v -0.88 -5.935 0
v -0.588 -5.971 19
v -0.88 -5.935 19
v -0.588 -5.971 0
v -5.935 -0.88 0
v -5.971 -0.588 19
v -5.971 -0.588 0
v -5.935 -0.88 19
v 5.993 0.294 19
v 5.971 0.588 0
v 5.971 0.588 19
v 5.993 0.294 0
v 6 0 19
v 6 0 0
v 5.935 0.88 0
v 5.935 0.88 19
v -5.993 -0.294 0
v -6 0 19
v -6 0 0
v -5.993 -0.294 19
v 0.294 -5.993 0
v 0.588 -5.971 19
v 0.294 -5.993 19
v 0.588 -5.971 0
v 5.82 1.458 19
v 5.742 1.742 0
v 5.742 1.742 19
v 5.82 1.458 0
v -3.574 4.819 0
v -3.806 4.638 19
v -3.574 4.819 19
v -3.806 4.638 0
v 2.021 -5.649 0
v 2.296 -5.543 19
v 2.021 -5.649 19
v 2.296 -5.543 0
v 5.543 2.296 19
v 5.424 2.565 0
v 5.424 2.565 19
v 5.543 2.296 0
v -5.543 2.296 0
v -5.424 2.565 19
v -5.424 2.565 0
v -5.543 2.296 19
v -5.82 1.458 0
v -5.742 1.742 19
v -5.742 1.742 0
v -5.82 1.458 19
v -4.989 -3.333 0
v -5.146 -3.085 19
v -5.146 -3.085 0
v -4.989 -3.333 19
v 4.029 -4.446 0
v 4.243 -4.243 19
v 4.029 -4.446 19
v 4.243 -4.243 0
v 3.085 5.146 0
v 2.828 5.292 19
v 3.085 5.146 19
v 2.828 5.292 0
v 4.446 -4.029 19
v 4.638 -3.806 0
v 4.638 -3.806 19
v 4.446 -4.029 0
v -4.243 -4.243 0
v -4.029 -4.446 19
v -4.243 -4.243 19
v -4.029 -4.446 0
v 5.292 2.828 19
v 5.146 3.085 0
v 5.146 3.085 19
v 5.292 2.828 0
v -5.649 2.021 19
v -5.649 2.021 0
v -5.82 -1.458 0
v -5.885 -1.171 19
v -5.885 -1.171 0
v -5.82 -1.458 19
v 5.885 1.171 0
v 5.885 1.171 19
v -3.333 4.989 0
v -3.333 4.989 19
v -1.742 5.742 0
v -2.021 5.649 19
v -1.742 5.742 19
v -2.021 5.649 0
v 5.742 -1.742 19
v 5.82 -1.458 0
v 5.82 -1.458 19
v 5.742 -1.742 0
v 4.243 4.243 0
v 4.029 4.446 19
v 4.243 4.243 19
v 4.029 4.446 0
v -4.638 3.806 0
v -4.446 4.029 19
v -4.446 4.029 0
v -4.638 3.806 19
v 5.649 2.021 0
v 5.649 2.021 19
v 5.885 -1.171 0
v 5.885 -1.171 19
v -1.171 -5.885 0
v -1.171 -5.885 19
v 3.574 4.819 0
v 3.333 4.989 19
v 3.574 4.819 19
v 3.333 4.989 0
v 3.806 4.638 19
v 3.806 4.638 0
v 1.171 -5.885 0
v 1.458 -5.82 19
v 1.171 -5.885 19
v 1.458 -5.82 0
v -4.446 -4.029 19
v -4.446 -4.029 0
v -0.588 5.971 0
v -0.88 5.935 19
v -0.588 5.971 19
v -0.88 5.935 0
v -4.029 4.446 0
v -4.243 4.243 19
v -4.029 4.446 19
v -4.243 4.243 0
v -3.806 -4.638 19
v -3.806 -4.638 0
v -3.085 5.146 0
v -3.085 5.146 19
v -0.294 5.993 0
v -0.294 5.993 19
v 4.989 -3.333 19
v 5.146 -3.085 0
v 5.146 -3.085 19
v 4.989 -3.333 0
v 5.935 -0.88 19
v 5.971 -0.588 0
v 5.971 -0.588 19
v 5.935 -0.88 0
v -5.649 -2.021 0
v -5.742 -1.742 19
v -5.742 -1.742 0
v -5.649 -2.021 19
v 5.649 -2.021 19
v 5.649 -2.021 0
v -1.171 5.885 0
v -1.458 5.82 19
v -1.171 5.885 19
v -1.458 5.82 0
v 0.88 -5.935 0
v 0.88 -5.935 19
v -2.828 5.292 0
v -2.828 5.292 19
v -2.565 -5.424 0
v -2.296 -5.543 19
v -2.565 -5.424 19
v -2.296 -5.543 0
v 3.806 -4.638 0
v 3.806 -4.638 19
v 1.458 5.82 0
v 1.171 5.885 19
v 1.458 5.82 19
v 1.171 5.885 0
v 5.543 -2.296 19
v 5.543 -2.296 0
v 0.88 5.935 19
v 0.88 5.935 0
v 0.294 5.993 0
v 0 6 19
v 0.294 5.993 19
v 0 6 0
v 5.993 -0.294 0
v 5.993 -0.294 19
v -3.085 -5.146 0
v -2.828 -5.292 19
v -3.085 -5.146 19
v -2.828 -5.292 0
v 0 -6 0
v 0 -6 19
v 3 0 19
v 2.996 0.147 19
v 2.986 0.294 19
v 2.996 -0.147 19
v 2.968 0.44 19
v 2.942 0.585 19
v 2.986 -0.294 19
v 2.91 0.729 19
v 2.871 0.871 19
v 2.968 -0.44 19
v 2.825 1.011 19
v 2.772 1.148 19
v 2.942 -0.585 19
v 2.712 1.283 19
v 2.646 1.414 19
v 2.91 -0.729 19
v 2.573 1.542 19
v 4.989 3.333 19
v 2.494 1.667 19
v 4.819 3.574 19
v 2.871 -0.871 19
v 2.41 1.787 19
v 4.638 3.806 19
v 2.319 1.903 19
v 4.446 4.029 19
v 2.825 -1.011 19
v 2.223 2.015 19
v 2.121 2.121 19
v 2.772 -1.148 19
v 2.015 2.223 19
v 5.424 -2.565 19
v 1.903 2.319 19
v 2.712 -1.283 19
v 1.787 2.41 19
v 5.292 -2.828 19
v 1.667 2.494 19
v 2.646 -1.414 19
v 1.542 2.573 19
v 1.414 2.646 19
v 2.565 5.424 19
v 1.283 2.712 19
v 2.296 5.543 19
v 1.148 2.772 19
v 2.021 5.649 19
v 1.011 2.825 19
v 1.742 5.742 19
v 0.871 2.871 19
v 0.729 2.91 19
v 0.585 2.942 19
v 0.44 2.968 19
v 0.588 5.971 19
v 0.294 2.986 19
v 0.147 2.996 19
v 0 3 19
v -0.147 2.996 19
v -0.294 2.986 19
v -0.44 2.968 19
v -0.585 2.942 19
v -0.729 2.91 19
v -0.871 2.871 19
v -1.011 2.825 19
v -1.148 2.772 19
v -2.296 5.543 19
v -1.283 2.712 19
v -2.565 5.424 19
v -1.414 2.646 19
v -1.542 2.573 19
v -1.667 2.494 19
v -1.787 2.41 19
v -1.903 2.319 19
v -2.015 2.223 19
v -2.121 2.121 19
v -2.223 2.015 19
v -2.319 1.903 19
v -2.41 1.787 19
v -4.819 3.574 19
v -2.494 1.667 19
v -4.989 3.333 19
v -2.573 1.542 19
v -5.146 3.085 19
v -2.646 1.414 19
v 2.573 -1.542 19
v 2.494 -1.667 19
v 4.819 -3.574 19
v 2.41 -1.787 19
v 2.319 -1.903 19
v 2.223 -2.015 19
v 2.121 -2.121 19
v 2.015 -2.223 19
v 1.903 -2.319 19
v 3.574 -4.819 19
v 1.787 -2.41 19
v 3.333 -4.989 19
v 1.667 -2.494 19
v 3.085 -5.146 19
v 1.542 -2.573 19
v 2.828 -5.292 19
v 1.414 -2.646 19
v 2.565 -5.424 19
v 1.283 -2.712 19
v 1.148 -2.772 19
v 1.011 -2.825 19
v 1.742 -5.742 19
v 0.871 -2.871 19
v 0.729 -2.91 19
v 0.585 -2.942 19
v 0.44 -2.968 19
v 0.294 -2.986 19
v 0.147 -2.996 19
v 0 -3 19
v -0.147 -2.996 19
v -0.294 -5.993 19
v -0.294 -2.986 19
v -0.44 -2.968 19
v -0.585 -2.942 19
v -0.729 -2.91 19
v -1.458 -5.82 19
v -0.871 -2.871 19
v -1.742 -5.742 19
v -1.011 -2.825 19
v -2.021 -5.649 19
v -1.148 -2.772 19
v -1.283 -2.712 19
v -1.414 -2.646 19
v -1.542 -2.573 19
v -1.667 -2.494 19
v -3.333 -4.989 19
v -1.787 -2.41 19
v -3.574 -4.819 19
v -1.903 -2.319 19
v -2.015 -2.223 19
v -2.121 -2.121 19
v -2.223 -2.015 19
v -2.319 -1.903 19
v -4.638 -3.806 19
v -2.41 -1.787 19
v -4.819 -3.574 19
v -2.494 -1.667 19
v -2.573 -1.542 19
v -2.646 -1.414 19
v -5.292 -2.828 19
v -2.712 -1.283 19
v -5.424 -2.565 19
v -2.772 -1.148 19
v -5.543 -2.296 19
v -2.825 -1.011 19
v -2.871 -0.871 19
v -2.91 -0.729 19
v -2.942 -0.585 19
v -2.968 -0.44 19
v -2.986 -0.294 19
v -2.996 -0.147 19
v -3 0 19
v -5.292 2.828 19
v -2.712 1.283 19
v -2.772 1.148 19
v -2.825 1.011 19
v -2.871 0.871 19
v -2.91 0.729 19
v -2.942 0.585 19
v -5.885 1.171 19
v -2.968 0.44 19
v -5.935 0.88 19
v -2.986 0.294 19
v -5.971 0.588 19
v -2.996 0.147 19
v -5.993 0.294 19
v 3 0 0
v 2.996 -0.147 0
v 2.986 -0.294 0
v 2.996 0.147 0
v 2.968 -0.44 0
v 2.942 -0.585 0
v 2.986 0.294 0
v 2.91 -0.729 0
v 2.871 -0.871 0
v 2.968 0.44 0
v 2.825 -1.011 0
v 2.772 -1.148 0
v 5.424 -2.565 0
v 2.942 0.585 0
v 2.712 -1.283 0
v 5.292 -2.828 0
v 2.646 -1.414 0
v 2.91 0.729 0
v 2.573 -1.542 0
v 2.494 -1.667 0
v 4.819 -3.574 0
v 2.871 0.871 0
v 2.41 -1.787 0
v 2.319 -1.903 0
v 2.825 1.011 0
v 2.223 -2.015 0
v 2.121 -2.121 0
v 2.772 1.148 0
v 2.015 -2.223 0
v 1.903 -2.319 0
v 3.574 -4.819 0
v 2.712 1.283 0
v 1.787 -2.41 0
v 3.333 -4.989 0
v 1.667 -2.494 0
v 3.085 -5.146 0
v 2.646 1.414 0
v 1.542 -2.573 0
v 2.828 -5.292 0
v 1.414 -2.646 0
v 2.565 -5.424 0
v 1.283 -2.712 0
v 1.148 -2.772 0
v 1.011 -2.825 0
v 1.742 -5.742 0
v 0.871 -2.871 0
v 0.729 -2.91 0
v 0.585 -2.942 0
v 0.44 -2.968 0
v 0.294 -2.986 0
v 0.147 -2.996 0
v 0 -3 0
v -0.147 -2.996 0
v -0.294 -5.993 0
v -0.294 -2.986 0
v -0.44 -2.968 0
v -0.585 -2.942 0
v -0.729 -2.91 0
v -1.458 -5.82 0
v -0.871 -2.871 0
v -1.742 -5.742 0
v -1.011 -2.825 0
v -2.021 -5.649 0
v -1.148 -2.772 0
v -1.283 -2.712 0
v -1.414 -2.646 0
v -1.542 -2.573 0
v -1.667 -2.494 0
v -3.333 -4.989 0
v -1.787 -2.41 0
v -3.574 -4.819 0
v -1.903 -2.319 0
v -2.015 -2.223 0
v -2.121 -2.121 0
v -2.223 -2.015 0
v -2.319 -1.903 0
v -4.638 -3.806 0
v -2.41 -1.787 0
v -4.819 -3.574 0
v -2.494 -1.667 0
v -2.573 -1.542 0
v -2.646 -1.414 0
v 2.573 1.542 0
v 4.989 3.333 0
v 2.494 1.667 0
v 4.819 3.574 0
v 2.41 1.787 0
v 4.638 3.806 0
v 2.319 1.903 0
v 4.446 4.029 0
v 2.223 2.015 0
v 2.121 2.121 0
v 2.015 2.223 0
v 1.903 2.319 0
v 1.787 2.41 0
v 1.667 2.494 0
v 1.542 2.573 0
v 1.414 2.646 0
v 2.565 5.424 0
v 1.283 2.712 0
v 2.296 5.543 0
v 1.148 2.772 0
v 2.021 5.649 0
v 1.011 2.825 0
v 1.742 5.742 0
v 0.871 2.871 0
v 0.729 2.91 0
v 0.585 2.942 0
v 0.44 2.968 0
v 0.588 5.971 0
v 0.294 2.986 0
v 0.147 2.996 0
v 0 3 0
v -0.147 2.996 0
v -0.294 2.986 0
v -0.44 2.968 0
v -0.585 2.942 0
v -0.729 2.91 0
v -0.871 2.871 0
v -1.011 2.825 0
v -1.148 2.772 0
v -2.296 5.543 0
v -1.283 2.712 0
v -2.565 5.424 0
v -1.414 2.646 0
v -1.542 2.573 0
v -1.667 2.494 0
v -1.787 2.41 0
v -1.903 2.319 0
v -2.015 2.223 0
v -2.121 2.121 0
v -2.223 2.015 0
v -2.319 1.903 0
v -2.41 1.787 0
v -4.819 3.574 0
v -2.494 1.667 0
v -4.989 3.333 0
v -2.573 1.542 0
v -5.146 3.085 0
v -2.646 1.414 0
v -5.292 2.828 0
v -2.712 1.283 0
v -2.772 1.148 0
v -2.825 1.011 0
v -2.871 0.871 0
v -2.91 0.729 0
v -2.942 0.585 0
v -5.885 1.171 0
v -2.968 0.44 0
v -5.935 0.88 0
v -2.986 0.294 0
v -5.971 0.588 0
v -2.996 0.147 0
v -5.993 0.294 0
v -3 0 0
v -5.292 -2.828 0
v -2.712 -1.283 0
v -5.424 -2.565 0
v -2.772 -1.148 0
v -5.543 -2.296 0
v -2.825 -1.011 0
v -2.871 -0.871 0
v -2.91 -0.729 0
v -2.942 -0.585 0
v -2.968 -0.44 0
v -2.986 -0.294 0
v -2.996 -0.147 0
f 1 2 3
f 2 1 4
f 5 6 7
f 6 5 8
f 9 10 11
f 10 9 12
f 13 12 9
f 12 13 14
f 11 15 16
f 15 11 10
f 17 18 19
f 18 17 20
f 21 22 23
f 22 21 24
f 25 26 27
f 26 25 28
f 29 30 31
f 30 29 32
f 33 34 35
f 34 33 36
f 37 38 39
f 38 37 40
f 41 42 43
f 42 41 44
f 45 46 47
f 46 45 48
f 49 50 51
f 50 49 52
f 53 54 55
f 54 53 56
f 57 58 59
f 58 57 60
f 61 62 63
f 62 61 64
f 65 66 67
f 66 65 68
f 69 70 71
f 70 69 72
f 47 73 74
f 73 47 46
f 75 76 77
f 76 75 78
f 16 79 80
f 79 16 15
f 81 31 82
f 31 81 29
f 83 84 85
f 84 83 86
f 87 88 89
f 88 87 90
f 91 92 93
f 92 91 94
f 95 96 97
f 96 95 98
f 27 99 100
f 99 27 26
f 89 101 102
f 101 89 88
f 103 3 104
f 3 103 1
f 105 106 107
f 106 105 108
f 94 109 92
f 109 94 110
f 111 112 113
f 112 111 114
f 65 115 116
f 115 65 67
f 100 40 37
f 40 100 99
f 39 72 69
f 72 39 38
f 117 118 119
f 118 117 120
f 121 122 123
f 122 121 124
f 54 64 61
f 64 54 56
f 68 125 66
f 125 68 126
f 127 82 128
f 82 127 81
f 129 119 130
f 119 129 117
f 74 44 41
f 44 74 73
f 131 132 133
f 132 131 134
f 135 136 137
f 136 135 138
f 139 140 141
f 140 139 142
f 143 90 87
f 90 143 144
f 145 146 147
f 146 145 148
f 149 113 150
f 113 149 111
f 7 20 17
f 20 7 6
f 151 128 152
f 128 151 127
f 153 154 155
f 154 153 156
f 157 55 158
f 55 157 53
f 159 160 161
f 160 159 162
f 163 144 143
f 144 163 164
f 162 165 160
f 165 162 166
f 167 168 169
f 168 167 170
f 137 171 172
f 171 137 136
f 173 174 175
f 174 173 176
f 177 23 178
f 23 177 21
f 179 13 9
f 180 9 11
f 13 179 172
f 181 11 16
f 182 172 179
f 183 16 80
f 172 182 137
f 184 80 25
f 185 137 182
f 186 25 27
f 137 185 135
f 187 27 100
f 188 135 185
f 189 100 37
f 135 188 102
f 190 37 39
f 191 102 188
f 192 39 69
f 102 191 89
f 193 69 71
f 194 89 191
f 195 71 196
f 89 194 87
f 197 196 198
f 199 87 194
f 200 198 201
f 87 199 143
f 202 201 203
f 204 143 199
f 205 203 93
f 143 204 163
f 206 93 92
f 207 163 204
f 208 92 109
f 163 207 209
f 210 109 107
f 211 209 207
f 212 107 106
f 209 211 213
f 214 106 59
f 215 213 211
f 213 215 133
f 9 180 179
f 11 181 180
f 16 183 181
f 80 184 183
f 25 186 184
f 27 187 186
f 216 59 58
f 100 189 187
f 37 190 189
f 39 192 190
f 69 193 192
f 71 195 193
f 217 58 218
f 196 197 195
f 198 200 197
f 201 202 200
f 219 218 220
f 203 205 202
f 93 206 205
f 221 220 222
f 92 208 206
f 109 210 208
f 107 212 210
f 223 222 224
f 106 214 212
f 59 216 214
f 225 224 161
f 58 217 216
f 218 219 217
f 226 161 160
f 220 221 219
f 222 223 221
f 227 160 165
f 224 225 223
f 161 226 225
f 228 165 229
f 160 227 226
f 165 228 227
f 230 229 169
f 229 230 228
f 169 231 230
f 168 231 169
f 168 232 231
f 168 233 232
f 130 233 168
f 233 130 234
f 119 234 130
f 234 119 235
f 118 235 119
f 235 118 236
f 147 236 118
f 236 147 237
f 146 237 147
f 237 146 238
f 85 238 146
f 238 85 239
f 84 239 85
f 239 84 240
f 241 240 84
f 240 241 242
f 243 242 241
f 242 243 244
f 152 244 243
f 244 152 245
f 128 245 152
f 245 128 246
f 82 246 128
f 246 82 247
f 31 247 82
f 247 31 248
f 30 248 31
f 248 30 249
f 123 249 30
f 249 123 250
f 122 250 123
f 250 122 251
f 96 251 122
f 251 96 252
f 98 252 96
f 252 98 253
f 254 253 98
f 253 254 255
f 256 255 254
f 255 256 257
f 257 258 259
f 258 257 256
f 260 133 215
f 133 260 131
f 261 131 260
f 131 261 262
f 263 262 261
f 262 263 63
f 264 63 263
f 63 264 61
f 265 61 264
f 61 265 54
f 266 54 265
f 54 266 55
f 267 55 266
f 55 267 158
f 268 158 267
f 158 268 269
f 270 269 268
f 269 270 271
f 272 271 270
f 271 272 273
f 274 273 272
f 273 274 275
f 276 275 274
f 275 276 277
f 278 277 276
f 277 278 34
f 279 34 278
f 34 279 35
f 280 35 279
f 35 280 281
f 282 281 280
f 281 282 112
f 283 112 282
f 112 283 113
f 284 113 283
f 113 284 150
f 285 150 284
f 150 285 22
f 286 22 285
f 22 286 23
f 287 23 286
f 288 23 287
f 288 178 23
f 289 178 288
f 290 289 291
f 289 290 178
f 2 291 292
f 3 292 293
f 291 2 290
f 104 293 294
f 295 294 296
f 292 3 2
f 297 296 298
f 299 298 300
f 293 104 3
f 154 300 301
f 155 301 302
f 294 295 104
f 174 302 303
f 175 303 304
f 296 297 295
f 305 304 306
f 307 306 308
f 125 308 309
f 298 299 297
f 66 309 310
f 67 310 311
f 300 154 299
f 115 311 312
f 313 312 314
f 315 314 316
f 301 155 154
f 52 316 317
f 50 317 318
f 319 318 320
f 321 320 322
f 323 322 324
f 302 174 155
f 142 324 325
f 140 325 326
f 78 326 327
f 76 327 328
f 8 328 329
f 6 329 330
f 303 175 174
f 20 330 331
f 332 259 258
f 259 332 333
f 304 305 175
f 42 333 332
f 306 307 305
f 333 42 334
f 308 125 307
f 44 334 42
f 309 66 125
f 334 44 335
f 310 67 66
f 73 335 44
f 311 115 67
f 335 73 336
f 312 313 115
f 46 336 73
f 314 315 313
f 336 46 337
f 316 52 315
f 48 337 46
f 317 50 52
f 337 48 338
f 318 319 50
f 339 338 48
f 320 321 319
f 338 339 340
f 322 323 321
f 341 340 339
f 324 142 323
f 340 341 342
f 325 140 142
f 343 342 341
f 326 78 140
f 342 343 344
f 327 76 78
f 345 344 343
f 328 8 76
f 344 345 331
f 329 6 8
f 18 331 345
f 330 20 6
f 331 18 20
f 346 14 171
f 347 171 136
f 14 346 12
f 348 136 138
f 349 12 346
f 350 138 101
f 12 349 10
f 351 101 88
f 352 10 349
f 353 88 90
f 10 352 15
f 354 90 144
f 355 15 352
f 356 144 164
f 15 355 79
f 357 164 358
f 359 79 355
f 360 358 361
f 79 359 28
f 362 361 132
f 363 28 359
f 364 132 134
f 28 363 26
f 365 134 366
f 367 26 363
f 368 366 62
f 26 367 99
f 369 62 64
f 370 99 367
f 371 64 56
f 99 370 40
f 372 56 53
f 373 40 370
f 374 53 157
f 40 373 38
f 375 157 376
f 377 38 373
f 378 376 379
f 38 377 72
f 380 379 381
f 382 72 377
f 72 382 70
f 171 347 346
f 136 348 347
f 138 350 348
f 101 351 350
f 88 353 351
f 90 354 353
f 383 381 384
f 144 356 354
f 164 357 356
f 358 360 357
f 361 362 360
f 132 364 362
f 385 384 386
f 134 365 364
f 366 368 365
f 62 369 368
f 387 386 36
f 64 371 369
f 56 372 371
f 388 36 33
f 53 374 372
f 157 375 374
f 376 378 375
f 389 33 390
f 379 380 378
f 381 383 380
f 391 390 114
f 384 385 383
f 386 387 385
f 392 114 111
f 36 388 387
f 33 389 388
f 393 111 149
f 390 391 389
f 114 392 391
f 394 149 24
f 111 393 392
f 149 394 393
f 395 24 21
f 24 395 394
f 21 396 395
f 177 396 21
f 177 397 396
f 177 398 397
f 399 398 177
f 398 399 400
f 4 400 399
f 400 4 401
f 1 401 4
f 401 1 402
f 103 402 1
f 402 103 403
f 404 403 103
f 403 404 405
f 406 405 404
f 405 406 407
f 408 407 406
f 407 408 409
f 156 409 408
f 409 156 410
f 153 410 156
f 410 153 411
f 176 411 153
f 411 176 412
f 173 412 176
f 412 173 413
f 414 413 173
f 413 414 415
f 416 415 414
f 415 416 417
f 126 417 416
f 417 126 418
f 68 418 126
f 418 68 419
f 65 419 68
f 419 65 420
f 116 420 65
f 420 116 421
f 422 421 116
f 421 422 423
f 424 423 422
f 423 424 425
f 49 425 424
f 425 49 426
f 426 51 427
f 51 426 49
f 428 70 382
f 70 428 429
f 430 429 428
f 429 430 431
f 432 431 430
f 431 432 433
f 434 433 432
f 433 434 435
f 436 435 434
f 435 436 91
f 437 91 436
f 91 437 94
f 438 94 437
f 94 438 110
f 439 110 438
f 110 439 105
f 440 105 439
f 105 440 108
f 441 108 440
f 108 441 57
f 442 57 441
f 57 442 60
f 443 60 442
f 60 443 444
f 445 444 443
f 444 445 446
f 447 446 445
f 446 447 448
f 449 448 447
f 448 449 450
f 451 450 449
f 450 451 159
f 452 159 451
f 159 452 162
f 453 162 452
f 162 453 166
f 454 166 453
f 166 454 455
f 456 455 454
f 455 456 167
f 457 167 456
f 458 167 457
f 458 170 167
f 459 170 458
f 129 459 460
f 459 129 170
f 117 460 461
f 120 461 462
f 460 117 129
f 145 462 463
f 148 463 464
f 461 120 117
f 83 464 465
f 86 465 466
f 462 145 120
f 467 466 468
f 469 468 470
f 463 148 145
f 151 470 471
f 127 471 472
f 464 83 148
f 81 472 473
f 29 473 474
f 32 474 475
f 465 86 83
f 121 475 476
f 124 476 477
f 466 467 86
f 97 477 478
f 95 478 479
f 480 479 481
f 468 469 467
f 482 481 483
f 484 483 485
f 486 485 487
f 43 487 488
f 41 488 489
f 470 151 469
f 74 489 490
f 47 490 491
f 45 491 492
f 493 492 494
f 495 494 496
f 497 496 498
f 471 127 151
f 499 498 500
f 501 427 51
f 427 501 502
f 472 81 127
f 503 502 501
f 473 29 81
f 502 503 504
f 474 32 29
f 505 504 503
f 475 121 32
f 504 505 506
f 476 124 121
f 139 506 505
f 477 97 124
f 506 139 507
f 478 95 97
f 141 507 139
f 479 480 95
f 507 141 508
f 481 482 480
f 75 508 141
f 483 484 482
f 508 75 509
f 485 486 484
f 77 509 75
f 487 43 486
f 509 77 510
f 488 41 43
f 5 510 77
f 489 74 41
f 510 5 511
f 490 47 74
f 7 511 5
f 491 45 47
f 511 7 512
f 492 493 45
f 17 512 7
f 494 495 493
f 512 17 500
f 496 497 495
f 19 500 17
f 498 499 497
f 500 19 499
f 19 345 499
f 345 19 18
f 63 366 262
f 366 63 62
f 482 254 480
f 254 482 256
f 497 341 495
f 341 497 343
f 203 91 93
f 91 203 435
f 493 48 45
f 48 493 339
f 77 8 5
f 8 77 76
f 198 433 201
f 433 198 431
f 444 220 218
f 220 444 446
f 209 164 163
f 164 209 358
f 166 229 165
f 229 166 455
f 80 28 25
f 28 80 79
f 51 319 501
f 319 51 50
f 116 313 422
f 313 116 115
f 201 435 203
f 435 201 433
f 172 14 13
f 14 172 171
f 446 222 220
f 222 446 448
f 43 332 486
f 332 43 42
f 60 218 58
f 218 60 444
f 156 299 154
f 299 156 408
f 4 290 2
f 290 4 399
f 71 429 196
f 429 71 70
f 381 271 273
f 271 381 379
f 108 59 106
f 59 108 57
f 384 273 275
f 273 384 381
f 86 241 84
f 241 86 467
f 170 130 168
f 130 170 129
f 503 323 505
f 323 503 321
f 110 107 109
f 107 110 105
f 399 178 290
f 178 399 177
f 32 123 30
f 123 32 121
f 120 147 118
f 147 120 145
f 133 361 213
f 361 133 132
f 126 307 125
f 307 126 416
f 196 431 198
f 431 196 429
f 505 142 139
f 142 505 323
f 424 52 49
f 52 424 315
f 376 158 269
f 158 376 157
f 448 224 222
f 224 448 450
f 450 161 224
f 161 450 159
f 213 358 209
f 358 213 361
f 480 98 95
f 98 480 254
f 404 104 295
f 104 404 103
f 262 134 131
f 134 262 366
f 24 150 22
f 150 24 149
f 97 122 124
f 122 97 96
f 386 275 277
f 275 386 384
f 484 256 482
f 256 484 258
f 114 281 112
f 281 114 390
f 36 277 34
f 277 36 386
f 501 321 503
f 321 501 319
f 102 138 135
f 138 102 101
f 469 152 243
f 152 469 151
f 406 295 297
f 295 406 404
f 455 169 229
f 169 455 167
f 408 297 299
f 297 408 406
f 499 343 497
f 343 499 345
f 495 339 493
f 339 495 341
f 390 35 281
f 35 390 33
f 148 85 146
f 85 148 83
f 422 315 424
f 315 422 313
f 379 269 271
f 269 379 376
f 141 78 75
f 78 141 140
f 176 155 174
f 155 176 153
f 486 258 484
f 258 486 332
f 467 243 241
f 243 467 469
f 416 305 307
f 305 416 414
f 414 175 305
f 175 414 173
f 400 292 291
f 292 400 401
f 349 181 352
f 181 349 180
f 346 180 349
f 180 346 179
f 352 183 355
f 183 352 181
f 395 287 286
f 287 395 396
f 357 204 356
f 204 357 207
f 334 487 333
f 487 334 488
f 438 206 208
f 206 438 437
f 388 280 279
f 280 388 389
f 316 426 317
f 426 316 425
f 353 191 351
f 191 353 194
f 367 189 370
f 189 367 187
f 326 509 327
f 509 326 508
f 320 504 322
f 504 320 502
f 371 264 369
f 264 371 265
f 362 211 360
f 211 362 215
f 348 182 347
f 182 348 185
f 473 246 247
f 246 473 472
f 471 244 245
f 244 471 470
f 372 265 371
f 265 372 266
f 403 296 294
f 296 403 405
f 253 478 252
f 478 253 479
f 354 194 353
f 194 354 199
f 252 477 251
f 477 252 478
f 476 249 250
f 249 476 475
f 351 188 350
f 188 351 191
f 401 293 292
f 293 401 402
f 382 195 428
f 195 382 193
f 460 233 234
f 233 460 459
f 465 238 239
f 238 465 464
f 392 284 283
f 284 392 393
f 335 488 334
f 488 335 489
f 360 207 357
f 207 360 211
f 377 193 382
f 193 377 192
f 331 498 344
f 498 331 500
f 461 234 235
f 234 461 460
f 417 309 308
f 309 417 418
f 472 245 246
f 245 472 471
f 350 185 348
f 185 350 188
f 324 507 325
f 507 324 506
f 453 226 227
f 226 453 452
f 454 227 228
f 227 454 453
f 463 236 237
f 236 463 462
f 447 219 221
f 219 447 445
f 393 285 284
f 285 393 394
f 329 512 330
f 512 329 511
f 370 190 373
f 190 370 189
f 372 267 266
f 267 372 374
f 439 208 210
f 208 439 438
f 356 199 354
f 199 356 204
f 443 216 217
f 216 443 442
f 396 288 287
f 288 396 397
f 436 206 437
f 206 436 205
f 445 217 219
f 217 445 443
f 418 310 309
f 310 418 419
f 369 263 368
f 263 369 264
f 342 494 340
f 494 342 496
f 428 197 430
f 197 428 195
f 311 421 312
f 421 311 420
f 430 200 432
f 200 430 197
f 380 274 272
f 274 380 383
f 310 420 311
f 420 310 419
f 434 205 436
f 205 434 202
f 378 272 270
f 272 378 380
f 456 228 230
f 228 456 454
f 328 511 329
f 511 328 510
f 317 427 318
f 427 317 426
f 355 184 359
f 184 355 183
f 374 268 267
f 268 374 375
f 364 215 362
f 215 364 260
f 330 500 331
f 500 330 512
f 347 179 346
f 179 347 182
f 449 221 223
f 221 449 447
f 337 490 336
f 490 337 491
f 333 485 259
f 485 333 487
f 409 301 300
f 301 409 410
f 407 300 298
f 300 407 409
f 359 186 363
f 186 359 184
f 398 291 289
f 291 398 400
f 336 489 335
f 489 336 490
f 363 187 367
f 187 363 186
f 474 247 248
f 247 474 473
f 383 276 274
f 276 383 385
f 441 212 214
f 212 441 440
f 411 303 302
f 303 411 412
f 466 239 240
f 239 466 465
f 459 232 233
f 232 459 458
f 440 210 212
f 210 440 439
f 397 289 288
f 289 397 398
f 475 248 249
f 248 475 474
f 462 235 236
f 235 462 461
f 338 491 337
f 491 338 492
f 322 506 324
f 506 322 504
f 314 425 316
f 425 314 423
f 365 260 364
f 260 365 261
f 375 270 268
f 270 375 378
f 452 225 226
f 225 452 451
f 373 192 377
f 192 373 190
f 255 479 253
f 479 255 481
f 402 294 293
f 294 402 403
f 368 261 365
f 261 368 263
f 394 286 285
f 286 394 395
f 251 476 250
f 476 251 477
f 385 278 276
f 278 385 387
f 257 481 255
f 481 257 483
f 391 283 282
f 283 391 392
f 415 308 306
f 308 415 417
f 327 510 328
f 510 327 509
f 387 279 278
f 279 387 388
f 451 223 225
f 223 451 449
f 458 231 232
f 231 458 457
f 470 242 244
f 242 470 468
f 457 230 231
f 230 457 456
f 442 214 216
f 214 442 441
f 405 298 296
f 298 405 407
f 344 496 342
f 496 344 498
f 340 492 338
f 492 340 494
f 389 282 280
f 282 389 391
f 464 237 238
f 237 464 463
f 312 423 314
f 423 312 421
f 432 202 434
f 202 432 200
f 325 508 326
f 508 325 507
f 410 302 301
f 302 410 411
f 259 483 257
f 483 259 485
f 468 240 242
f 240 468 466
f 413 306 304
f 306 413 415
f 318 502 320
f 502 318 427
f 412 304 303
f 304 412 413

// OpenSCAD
$fn = 128;

bore_d = 6.0;
od_d   = 12.0;
len    = 19.0;

difference() {
  cylinder(d = od_d, h = len, center = false);
  translate([0,0,-0.1]) cylinder(d = bore_d, h = len + 0.2, center = false);
}
